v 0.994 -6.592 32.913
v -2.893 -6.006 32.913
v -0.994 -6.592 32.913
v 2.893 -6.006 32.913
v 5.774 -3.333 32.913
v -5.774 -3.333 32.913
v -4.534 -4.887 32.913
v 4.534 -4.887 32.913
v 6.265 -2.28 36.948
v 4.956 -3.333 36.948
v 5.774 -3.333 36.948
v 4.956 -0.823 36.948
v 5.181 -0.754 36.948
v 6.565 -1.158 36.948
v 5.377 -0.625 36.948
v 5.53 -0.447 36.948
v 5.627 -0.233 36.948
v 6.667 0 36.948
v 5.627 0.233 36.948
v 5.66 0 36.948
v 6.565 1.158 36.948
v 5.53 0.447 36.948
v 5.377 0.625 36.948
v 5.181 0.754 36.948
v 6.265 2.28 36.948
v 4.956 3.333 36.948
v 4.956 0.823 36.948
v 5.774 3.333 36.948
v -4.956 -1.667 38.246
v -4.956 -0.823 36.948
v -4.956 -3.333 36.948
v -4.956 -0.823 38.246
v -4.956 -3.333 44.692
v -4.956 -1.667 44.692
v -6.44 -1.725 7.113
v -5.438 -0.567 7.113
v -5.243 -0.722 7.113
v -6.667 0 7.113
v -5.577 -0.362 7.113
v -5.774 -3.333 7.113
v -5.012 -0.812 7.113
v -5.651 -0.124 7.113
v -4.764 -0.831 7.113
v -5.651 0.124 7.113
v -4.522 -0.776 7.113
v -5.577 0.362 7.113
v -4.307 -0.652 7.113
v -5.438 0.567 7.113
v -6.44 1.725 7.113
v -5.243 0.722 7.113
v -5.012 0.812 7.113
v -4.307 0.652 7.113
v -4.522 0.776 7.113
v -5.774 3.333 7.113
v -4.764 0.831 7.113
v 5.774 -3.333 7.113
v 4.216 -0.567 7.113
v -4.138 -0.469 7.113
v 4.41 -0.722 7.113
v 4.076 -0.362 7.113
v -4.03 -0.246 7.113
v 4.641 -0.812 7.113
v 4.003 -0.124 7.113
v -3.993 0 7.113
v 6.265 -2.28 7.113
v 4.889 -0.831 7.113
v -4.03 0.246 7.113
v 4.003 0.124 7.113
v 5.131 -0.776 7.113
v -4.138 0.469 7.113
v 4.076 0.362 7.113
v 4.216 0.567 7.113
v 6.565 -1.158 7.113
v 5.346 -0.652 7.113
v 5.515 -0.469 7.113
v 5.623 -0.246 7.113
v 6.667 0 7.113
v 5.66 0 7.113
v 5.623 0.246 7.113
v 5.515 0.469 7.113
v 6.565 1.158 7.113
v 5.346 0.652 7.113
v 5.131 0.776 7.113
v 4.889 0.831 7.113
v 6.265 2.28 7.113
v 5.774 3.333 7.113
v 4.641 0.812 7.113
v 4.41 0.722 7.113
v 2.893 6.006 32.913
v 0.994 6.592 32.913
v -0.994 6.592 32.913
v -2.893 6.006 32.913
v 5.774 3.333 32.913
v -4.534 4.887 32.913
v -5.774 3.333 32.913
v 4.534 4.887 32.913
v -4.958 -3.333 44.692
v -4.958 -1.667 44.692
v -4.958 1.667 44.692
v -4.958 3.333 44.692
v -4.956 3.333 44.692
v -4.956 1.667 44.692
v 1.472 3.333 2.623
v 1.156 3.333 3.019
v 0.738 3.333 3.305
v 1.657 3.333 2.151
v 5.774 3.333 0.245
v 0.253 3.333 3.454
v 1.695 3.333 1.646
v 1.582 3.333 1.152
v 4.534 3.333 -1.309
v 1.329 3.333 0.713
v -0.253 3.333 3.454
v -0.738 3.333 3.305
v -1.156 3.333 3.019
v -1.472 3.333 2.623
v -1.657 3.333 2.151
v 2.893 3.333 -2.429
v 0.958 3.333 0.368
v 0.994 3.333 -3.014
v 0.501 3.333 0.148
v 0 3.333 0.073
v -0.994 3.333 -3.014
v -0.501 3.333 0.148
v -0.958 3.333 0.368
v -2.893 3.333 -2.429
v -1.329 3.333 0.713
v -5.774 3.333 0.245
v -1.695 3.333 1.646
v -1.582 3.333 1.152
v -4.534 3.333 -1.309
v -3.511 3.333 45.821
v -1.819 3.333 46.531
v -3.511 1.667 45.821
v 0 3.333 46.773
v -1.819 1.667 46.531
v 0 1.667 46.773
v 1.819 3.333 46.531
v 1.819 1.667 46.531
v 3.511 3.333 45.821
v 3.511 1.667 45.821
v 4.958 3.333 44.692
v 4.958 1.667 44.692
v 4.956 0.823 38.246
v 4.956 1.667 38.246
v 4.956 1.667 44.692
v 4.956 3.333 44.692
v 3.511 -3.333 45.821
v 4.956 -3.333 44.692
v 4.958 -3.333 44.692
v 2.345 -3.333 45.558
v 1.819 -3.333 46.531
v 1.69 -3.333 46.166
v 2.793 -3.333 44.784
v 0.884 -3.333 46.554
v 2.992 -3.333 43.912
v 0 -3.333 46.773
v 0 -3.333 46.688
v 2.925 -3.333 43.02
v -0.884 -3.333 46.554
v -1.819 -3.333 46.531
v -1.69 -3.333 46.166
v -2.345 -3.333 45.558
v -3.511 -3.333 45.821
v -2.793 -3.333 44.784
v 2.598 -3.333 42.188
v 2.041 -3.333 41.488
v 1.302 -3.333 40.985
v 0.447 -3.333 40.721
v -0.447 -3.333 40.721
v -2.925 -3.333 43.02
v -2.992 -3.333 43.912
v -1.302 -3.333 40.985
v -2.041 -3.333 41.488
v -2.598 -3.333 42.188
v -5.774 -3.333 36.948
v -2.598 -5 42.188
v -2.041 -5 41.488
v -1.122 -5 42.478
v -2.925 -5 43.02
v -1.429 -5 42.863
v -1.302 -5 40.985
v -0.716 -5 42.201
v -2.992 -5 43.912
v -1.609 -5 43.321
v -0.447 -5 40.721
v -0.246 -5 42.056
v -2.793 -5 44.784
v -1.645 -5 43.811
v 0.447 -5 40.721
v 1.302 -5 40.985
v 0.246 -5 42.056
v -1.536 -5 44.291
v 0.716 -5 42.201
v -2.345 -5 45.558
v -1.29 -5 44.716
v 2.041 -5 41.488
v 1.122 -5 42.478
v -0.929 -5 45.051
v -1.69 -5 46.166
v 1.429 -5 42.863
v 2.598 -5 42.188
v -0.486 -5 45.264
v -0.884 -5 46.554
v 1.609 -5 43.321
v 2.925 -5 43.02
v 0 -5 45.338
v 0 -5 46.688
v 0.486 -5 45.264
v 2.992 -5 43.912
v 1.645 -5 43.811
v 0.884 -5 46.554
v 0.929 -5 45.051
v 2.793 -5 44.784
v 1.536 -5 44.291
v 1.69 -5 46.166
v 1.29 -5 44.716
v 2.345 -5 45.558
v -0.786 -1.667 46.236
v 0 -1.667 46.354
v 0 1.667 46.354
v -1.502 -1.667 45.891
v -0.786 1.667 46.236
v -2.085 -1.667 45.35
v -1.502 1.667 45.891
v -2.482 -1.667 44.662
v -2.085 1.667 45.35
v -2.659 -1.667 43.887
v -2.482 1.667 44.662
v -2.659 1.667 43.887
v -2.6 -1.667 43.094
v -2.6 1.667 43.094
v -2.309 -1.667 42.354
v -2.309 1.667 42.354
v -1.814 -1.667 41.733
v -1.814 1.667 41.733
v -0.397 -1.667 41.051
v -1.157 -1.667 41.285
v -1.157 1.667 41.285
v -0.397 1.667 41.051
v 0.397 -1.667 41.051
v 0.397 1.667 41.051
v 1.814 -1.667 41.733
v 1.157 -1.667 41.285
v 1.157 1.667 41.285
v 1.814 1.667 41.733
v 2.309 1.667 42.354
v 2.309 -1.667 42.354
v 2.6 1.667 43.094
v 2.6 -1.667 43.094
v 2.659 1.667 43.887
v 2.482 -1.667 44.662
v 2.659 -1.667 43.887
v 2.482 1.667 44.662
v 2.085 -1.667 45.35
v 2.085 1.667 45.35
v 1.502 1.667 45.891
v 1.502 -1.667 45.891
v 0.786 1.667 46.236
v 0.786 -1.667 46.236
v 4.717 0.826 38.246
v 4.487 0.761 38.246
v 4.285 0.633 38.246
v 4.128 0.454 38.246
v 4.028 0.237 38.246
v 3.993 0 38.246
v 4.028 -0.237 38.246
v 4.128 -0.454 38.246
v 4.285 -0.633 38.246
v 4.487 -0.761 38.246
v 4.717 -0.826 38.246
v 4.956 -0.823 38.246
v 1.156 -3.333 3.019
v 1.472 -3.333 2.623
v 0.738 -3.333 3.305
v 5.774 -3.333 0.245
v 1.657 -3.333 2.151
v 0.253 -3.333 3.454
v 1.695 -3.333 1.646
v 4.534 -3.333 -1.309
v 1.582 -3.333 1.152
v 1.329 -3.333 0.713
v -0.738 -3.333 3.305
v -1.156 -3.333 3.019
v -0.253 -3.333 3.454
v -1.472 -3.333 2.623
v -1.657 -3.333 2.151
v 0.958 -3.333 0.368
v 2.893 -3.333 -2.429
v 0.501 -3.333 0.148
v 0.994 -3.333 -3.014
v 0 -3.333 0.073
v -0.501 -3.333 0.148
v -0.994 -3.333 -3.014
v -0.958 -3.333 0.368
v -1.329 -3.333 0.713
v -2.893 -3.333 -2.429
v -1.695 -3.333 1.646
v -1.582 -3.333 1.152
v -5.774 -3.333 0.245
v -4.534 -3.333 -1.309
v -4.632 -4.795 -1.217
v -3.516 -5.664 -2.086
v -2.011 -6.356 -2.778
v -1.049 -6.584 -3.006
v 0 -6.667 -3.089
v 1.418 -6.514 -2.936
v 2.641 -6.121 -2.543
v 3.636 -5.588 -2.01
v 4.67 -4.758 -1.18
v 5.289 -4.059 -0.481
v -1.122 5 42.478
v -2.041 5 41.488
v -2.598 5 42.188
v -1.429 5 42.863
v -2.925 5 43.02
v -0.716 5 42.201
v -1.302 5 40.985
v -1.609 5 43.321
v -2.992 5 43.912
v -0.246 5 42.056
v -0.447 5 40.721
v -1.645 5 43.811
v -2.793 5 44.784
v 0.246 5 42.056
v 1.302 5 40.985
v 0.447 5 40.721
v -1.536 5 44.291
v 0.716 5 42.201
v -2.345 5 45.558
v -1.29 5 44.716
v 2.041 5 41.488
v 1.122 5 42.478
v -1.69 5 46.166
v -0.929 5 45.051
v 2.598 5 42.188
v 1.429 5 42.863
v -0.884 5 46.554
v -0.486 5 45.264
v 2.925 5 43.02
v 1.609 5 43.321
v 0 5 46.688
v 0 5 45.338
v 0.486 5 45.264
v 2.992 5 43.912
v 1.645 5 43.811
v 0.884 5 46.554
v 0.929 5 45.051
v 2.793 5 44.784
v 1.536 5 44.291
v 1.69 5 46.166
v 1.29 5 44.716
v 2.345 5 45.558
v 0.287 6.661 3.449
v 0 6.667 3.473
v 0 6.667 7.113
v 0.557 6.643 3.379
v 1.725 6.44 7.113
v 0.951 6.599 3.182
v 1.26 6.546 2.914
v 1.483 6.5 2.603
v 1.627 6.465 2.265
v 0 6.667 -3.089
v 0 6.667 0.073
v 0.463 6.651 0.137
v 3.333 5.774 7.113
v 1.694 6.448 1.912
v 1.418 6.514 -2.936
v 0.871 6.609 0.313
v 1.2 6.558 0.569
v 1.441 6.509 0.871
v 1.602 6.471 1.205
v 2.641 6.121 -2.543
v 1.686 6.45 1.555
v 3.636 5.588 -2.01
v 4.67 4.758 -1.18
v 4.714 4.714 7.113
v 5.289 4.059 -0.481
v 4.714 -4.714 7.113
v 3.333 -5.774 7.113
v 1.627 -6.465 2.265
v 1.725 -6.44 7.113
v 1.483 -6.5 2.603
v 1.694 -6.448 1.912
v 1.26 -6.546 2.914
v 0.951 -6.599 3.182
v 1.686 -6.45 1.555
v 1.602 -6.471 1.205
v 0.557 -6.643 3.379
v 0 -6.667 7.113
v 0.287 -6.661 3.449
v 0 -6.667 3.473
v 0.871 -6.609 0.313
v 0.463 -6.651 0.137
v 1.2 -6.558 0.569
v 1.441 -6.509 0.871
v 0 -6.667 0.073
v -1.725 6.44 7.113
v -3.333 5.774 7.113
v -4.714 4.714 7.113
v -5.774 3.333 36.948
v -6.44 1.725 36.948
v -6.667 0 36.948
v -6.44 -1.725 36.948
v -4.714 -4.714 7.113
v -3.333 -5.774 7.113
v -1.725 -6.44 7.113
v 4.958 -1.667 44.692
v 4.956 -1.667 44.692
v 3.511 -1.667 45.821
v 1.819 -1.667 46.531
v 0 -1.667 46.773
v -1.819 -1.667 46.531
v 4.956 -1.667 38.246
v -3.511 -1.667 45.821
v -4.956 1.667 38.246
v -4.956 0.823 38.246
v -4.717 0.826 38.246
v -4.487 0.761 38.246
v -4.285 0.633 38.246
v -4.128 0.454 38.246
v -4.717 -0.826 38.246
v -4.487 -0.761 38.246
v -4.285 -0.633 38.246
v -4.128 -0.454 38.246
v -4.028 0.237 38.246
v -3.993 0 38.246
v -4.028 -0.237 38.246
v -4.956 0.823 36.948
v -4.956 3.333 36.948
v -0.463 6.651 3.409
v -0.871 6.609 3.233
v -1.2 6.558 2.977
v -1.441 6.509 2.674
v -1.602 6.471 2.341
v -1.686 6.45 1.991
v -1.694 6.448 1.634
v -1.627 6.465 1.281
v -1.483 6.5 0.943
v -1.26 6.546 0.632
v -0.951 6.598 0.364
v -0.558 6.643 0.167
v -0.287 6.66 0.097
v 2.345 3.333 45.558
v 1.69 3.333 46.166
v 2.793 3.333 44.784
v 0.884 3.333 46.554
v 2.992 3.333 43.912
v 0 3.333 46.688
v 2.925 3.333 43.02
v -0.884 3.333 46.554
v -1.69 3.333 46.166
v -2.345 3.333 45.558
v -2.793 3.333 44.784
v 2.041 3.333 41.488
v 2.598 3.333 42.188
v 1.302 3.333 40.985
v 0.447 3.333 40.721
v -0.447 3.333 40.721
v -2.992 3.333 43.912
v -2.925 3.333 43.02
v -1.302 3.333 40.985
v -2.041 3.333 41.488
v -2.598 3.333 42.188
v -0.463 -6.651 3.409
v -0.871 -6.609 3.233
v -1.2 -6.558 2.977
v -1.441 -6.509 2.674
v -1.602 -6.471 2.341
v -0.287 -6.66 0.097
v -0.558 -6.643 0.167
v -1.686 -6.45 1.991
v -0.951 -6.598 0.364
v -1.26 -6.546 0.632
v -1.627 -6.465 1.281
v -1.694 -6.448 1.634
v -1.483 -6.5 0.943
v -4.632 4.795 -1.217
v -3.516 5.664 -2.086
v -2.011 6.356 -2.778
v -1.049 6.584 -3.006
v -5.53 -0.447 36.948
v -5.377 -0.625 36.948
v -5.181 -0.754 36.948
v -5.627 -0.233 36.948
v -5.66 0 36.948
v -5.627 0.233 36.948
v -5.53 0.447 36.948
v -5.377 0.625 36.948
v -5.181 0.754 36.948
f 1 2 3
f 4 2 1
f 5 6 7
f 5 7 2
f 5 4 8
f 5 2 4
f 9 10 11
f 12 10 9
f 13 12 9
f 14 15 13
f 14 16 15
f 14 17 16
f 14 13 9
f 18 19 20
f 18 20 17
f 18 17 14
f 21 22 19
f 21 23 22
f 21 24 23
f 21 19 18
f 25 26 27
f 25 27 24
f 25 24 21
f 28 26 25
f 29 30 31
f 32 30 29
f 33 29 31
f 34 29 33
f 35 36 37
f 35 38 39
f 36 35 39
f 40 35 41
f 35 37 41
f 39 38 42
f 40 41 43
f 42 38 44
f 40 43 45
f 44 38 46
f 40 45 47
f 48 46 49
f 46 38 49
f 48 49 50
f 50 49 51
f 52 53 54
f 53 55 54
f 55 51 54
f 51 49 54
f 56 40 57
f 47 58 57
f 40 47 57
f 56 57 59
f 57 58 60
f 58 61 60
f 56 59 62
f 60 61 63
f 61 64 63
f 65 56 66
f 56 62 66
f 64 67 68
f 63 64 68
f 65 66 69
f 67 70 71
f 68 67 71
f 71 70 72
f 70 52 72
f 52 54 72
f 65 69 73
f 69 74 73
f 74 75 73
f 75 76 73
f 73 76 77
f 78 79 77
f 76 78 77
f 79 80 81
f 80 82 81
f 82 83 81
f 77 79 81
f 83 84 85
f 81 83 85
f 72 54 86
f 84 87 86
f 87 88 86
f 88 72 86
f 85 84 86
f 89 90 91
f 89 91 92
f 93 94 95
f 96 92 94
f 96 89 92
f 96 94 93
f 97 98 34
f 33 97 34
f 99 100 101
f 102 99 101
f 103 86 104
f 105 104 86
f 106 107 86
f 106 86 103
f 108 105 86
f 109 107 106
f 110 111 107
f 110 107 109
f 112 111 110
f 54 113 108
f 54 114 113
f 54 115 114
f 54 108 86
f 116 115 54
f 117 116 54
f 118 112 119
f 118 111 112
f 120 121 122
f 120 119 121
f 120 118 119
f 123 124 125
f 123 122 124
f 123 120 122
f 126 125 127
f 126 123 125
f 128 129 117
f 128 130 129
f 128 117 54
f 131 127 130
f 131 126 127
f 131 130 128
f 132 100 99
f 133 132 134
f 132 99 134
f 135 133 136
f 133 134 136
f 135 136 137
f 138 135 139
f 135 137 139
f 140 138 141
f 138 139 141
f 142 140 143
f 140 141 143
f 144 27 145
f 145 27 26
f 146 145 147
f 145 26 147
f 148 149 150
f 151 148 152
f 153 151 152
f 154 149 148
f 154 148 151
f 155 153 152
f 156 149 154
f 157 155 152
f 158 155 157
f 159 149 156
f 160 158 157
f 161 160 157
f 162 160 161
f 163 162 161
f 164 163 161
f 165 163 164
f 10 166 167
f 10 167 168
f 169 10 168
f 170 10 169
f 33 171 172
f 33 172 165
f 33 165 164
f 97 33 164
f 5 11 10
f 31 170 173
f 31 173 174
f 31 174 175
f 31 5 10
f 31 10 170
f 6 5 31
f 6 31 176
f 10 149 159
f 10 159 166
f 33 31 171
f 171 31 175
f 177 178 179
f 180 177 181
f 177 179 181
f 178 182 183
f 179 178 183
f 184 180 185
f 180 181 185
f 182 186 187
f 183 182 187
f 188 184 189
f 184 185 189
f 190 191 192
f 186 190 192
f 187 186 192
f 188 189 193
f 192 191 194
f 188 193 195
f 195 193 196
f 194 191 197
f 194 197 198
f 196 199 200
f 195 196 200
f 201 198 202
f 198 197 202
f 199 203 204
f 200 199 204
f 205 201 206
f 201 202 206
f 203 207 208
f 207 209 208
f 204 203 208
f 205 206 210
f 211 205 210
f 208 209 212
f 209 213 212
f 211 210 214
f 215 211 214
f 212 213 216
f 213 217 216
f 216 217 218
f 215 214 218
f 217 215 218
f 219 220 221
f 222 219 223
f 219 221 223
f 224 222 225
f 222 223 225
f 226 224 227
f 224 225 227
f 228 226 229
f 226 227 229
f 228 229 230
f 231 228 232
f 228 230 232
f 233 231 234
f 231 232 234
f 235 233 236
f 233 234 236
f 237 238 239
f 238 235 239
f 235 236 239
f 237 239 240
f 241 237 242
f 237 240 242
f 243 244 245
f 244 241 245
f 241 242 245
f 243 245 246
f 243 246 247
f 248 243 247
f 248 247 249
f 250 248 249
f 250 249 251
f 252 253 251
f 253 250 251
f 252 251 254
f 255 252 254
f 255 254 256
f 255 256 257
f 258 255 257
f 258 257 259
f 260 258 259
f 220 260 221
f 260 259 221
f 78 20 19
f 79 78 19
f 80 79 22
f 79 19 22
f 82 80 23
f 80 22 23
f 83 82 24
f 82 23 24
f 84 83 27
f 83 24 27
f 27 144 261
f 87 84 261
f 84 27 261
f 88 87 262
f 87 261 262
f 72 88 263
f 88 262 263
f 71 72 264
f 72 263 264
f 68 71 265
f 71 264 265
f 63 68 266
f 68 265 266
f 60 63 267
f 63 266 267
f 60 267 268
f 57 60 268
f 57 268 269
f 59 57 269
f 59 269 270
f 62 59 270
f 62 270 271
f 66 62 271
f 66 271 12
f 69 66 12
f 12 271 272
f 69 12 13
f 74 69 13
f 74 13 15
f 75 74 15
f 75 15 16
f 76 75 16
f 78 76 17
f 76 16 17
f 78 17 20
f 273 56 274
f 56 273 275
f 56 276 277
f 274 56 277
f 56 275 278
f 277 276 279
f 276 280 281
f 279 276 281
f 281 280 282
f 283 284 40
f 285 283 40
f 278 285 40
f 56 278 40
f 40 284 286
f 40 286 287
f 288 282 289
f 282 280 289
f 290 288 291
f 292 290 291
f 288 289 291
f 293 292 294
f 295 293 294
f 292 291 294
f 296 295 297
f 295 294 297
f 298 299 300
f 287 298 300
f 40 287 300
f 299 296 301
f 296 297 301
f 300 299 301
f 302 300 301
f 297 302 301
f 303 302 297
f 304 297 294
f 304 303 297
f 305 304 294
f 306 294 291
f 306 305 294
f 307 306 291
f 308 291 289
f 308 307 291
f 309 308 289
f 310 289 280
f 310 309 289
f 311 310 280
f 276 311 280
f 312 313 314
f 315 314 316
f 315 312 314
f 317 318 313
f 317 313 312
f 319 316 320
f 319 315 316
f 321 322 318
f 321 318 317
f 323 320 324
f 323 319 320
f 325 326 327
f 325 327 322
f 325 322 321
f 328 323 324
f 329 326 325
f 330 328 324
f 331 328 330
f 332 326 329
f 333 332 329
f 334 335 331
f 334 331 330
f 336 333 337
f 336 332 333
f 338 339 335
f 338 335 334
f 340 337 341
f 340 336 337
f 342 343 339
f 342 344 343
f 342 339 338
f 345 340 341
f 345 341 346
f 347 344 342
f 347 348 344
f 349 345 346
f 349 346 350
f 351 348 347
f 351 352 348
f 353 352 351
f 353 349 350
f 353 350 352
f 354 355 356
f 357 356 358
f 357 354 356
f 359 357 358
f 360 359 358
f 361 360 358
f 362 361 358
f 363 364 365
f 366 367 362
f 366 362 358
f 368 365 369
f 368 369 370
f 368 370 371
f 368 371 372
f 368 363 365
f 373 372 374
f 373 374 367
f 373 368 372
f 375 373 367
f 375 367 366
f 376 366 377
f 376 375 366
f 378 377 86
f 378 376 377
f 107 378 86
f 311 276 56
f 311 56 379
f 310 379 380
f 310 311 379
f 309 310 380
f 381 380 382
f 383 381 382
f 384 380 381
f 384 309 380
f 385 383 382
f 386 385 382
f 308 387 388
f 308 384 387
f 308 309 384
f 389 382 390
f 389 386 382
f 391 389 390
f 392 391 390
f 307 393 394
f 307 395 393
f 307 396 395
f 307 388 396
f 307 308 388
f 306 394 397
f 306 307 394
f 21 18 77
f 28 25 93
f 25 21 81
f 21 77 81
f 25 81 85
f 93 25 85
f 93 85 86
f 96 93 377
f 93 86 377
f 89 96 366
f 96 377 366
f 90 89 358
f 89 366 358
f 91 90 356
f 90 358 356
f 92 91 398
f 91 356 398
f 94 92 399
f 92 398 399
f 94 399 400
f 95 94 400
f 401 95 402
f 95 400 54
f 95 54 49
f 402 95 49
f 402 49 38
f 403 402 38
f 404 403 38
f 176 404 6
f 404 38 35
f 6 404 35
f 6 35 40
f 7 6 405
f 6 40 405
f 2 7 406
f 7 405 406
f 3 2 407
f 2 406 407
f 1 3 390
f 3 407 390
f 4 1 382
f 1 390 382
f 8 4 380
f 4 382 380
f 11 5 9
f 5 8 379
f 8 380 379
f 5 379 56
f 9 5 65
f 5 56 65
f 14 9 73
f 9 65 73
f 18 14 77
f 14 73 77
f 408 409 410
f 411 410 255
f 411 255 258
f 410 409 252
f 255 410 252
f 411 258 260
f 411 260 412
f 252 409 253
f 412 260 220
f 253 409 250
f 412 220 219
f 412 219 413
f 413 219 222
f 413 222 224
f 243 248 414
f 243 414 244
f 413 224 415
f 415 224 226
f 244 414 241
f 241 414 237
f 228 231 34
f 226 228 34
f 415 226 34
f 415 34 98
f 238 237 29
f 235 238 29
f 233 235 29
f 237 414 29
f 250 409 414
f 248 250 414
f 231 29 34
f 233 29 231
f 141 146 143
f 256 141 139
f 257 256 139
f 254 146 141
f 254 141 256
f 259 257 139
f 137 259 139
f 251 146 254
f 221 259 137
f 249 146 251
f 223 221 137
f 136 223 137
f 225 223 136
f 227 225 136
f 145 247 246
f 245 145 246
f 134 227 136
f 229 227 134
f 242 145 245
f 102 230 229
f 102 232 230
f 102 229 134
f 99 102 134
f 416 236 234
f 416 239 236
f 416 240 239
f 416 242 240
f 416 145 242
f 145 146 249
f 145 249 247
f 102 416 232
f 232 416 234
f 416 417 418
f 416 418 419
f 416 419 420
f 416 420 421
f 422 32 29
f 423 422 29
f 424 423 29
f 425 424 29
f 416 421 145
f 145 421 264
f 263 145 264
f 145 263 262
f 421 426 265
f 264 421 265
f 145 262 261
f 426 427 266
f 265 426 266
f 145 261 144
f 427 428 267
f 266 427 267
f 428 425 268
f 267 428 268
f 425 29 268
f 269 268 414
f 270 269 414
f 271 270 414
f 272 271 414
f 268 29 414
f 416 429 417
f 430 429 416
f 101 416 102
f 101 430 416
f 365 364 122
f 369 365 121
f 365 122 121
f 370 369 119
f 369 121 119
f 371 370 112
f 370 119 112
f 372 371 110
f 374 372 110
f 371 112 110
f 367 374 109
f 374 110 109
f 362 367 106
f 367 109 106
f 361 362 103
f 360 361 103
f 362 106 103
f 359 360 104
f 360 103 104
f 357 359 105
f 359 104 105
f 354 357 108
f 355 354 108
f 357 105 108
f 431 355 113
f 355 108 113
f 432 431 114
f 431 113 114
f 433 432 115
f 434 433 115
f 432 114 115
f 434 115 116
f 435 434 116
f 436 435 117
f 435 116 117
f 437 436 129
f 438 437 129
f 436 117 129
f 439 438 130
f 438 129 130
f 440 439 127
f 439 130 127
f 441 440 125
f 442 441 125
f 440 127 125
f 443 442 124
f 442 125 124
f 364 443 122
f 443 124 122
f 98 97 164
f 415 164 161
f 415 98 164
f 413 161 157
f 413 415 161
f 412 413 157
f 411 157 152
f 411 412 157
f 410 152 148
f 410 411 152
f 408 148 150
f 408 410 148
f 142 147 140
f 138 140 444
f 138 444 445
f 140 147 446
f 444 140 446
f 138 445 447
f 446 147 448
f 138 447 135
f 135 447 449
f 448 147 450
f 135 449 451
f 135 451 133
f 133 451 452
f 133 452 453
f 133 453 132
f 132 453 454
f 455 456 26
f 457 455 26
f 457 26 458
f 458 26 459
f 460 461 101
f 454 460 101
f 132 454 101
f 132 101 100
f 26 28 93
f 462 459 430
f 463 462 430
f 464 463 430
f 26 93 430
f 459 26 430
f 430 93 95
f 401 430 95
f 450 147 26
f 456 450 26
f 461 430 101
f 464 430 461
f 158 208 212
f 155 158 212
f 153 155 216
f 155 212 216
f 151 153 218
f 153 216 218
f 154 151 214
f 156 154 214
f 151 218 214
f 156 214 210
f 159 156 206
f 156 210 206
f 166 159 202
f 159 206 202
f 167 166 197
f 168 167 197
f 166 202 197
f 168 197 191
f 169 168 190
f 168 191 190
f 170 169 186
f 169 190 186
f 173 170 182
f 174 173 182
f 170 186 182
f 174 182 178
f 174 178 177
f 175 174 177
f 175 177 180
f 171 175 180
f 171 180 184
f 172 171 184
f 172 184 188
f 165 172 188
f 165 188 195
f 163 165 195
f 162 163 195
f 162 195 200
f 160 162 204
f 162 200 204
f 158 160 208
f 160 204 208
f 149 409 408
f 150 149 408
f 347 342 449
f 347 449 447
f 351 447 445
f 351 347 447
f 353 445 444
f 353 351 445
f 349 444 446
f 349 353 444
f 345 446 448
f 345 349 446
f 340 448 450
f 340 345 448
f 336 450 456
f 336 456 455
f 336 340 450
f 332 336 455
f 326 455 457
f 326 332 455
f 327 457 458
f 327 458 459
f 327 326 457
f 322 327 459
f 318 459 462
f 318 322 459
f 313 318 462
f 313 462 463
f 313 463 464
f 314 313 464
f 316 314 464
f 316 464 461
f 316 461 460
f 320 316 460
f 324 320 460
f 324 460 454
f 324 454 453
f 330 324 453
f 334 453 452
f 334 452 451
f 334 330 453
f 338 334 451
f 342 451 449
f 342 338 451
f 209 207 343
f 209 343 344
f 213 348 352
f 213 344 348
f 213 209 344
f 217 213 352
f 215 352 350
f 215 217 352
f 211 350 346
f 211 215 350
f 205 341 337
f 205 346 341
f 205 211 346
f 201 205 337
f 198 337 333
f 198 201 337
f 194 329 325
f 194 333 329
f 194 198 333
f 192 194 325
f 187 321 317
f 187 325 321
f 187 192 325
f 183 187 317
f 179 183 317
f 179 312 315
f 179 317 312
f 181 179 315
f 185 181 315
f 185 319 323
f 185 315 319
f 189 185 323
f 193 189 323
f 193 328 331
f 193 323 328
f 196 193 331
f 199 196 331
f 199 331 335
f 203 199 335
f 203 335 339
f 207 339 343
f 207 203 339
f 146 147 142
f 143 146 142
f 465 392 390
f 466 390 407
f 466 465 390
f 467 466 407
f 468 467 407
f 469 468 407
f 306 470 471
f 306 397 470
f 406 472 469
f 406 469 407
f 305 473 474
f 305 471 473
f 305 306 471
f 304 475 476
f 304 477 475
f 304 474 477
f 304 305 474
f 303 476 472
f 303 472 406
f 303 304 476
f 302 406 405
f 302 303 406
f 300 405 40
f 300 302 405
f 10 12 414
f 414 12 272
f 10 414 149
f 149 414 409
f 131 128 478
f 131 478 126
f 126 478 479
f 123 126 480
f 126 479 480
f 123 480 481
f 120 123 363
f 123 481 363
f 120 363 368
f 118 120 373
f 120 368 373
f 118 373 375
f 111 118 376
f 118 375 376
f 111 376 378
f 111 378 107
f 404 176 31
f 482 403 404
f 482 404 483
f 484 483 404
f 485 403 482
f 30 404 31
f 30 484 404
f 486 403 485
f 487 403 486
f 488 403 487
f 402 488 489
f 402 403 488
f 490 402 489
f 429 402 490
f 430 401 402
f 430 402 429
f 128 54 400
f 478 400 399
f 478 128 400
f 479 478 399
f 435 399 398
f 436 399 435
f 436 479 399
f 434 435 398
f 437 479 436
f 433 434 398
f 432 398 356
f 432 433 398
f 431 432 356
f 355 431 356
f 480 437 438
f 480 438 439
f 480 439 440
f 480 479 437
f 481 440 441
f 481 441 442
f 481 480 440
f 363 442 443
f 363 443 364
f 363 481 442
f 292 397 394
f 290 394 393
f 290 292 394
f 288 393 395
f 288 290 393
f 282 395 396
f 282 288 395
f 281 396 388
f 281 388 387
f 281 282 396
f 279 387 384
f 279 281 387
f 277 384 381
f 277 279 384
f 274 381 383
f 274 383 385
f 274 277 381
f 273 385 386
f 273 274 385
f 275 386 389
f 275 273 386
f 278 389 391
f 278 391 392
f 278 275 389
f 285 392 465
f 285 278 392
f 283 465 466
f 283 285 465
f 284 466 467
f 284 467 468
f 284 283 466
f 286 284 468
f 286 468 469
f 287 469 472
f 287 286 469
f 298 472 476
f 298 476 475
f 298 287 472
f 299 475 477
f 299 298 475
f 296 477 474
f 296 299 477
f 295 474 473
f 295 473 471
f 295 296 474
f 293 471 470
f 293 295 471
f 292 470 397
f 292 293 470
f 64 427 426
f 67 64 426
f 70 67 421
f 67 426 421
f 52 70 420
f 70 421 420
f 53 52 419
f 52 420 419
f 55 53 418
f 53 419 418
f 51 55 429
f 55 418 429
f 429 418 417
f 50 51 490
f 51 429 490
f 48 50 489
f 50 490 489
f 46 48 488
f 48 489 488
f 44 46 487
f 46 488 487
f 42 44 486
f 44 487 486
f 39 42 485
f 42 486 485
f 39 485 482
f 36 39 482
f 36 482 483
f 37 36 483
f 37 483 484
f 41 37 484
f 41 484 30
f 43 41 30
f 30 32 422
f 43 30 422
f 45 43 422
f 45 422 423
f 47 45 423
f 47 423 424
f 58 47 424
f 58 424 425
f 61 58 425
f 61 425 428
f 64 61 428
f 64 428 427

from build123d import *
from build123d.topology import SkipClean

# Parameters (mm, degrees)
SKETCH2_R                       = 10
PHALANGE_LENGTH_DEPTH           = 46.7
BOSS_EXTRUDE3_DEPTH             = 5
BOSS_EXTRUDE4_DEPTH             = 5
BOSS_EXTRUDE4_DEPTH_BACK        = 5
CUT_EXTRUDE2_START              = -15.3025
CUT_EXTRUDE2_DEPTH              = 15.3025
SKETCH7_R                       = 1.65
CUT_EXTRUDE3_DEPTH              = 10
CUT_EXTRUDE4_DEPTH              = 2.5
CUT_EXTRUDE4_DEPTH_BACK         = 2.5
CUT_EXTRUDE7_REACH              = 66.618
SKETCH4_R                       = 1.65
CUT_EXTRUDE7_DIRECTION_2_REACH  = 66.618
CUT_EXTRUDE_THIN1_START         = 46.7
CUT_EXTRUDE_THIN1_DEPTH         = 10.361670454
BOSS_EXTRUDE5_REACH             = 66.084
SKETCH9_R                       = 4
SKETCH9_R_2                     = 1.65
CUT_EXTRUDE8_REACH              = 65.595
SKETCH10_R                      = 1.25
CUT_EXTRUDE9_START              = -8
CUT_EXTRUDE9_DEPTH              = 8
CUT_EXTRUDE10_REACH             = 66.084
CUT_EXTRUDE10_DIRECTION_2_REACH = 66.084
CUT_EXTRUDE11_START             = -10
CUT_EXTRUDE11_OUTLINE_W         = 2.565773848
CUT_EXTRUDE11_OUTLINE_H         = 11.6166929
CUT_EXTRUDE11_DEPTH             = 10
BOSS_EXTRUDE6_START             = 7.5
SKETCH14_R                      = 4.5
SKETCH14_R_2                    = 1.65
BOSS_EXTRUDE6_DEPTH             = 2.5
BOSS_EXTRUDE7_START             = -7.5
SKETCH14_2_R                    = 4.5
SKETCH14_2_R_2                  = 1.65
BOSS_EXTRUDE7_DEPTH             = 2.5
SCALE1_SCALE                    = 0.666666667
CUT_EXTRUDE12_START             = -11.666667
SKETCH15_R                      = 1.65
CUT_EXTRUDE12_DEPTH             = 13.333339
CUT_EXTRUDE13_REACH             = 50.293
SKETCH16_R                      = 1.7
CUT_EXTRUDE13_DIRECTION_2_REACH = 50.293


# Read off the part's stored shape, not the designer's step: Cut-Extrude-Thin1, Cut-Extrude11
with BuildPart() as part:
    # Sketch2 → Phalange Length (new body)
    with BuildSketch(Plane.XY):
        Circle(SKETCH2_R)
    extrude(amount=PHALANGE_LENGTH_DEPTH)

    # Sketch3 → Boss-Extrude3 (add)
    with BuildSketch(Plane(origin=(0, -10, 0), x_dir=(-1, 0, 0), z_dir=(0, -1, 0))):
        with BuildLine():
            Line((-10, 5.302499701), (-10, 0))
            Line((-10, 0), (10, 0))
            Line((10, 0), (10, 5.302499701))
            ThreePointArc((10, 5.302499701), (0, 15.302499701), (-10, 5.302499701))
        make_face()
    boss_extrude3 = extrude(amount=-BOSS_EXTRUDE3_DEPTH)

    # Mirror1: Boss-Extrude3 across plane
    add(boss_extrude3.mirror(Plane.ZX))

    # Sketch5 → Boss-Extrude4 (add, two sides: drawn at the far end of the back side and taken through both)
    with BuildSketch(Plane(origin=(0, 0, 0), x_dir=(1, 0, 0), z_dir=(0, 1, 0)).offset(-BOSS_EXTRUDE4_DEPTH_BACK)):
        with BuildLine():
            Line((-10, -52.483157911), (-10, -46.7))
            Line((-10, -46.7), (10, -46.7))
            Line((10, -46.7), (10, -52.483157911))
            ThreePointArc((10, -52.483157911), (0, -62.051984156), (-10, -52.483157911))
        make_face()
    extrude(amount=BOSS_EXTRUDE4_DEPTH + BOSS_EXTRUDE4_DEPTH_BACK)

    # Sketch6 → Cut-Extrude2 (cut)
    with SkipClean():  # the faces are left unmerged after this step: merging them gives an invalid solid
        with BuildSketch(Plane.XY.offset(CUT_EXTRUDE2_START)):
            with BuildLine():
                ThreePointArc((0, 10), (5, 8.660254038), (8.660254038, 5))
                Line((8.660254038, 5), (10, 5))
                Line((10, 5), (10, 10))
                Line((10, 10), (0, 10))
            make_face()
            with BuildLine():
                Line((10, -5), (8.660254038, -5))
                ThreePointArc((8.660254038, -5), (5, -8.660254038), (0, -10))
                Line((0, -10), (10, -10))
                Line((10, -10), (10, -5))
            make_face()
            with BuildLine():
                ThreePointArc((-8.660254038, 5), (-5, 8.660254038), (0, 10))
                Line((0, 10), (-10, 10))
                Line((-10, 10), (-10, 5))
                Line((-10, 5), (-8.660254038, 5))
            make_face()
            with BuildLine():
                Line((-10, -10), (0, -10))
                ThreePointArc((0, -10), (-5, -8.660254038), (-8.660254038, -5))
                Line((-8.660254038, -5), (-10, -5))
                Line((-10, -5), (-10, -10))
            make_face()
        extrude(amount=CUT_EXTRUDE2_DEPTH, mode=Mode.SUBTRACT)

    # Sketch7 → Cut-Extrude3 (cut)
    with SkipClean():  # the faces are left unmerged after this step: merging them gives an invalid solid
        with BuildSketch(Plane(origin=(0, 5, 0), x_dir=(1, 0, 0), z_dir=(0, 1, 0))):
            with Locations(Location((0, -54.861984156, 0), (0, 0, 270))):
                Circle(SKETCH7_R)
        extrude(amount=-CUT_EXTRUDE3_DEPTH, mode=Mode.SUBTRACT)

    # Sketch5<2> → Cut-Extrude4 (cut, two sides: drawn at the far end of the back side and taken through both)
    with BuildSketch(Plane(origin=(0, 0, 0), x_dir=(1, 0, 0), z_dir=(0, 1, 0)).offset(-CUT_EXTRUDE4_DEPTH_BACK)):
        with BuildLine():
            Line((-10, -52.483157911), (-10, -46.7))
            Line((-10, -46.7), (10, -46.7))
            Line((10, -46.7), (10, -52.483157911))
            ThreePointArc((10, -52.483157911), (0, -62.051984156), (-10, -52.483157911))
        make_face()
    extrude(amount=CUT_EXTRUDE4_DEPTH + CUT_EXTRUDE4_DEPTH_BACK, mode=Mode.SUBTRACT)

    # Sketch4 → Cut-Extrude7 (cut, up to next)
    with BuildSketch(Plane(origin=(0, -5, 0), x_dir=(1, 0, 0), z_dir=(0, 1, 0)), mode=Mode.PRIVATE) as cut_extrude7_sk1:
        with Locations(Location((0, 8.010159673, 0), (0, 0, 270))):
            Circle(SKETCH4_R)
    cut_extrude7_tool1 = extrude(cut_extrude7_sk1.sketch, amount=-CUT_EXTRUDE7_REACH, mode=Mode.PRIVATE) & part.part
    add(cut_extrude7_tool1.solids().sort_by_distance((0, -5, -8.01016))[0], mode=Mode.SUBTRACT)

    # Sketch4 → Cut-Extrude7 direction 2 (cut, up to next)
    with BuildSketch(Plane(origin=(0, -5, 0), x_dir=(1, 0, 0), z_dir=(0, 1, 0)), mode=Mode.PRIVATE) as cut_extrude7_direction_2_sk1:
        with Locations(Location((0, 8.010159673, 0), (0, 0, 270))):
            Circle(SKETCH4_R)
    cut_extrude7_direction_2_tool1 = extrude(cut_extrude7_direction_2_sk1.sketch, amount=CUT_EXTRUDE7_DIRECTION_2_REACH, mode=Mode.PRIVATE) & part.part
    add(cut_extrude7_direction_2_tool1.solids().sort_by_distance((0, -5, -8.01016))[0], mode=Mode.SUBTRACT)

    # Cut-Extrude-Thin1 outline → Cut-Extrude-Thin1 (cut)
    with SkipClean():  # the faces are left unmerged after this step: merging them gives an invalid solid
        with BuildSketch(Plane.XY.offset(CUT_EXTRUDE_THIN1_START)):
            with BuildLine():
                ThreePointArc((8.660254038, 5), (9.256147934, 3.78466979), (9.682458366, 2.5))
                Line((9.682458366, 2.5), (10, 2.5))
                Line((10, 2.5), (10, 5))
                Line((10, 5), (8.660254038, 5))
            make_face()
            with BuildLine():
                Line((10, -2.5), (9.682458366, -2.5))
                ThreePointArc((9.682458366, -2.5), (9.256147934, -3.78466979), (8.660254038, -5))
                Line((8.660254038, -5), (10, -5))
                Line((10, -5), (10, -2.5))
            make_face()
            with BuildLine():
                Line((-10, 2.5), (-9.682458366, 2.5))
                ThreePointArc((-9.682458366, 2.5), (-9.256147934, 3.78466979), (-8.660254038, 5))
                Line((-8.660254038, 5), (-10, 5))
                Line((-10, 5), (-10, 2.5))
            make_face()
            with BuildLine():
                ThreePointArc((-8.660254038, -5), (-9.256147934, -3.78466979), (-9.682458366, -2.5))
                Line((-9.682458366, -2.5), (-10, -2.5))
                Line((-10, -2.5), (-10, -5))
                Line((-10, -5), (-8.660254038, -5))
            make_face()
        extrude(amount=CUT_EXTRUDE_THIN1_DEPTH, mode=Mode.SUBTRACT)

    # Sketch9 → Boss-Extrude5 (add, up to next)
    with BuildSketch(Plane.XZ.offset(-2.5), mode=Mode.PRIVATE) as boss_extrude5_sk1:
        with Locations(Location((0, 54.861984156, 0), (0, 0, 90))):
            Circle(SKETCH9_R)
        with Locations(Location((0, 54.861984156, 0), (0, 0, 90))):
            Circle(SKETCH9_R_2, mode=Mode.SUBTRACT)
    boss_extrude5_tool1 = extrude(boss_extrude5_sk1.sketch, amount=BOSS_EXTRUDE5_REACH, mode=Mode.PRIVATE) - part.part
    add(boss_extrude5_tool1.solids().sort_by_distance((0, 2.5, 50.975121))[0])

    # Sketch10 → Cut-Extrude8 (cut, up to next)
    with BuildSketch(Plane.XY.offset(46.7), mode=Mode.PRIVATE) as cut_extrude8_sk1:
        with Locations((7.239961745, 0)):
            Circle(SKETCH10_R)
    cut_extrude8_tool1 = extrude(cut_extrude8_sk1.sketch, amount=-CUT_EXTRUDE8_REACH, mode=Mode.PRIVATE) & part.part
    # Sketch10 → Cut-Extrude8 (cut, up to next)
    with BuildSketch(Plane.XY.offset(46.7), mode=Mode.PRIVATE) as cut_extrude8_sk2:
        with Locations((-7.239961745, 0)):
            Circle(SKETCH10_R)
    cut_extrude8_tool2 = extrude(cut_extrude8_sk2.sketch, amount=-CUT_EXTRUDE8_REACH, mode=Mode.PRIVATE) & part.part
    add(cut_extrude8_tool1.solids().sort_by_distance((7.239962, 0, 46.7))[0], mode=Mode.SUBTRACT)
    add(cut_extrude8_tool2.solids().sort_by_distance((-7.239962, 0, 46.7))[0], mode=Mode.SUBTRACT)

    # Sketch11 → Cut-Extrude9 (cut)
    with SkipClean():  # the faces are left unmerged after this step: merging them gives an invalid solid
        with BuildSketch(Plane.XY.offset(46.7).offset(CUT_EXTRUDE9_START)):
            with BuildLine():
                ThreePointArc((8.660254038, 5), (0, 10), (-8.660254038, 5))
                Line((-8.660254038, 5), (8.660254038, 5))
            make_face()
            with BuildLine():
                Line((8.660254038, -5), (-8.660254038, -5))
                ThreePointArc((-8.660254038, -5), (0, -10), (8.660254038, -5))
            make_face()
        extrude(amount=CUT_EXTRUDE9_DEPTH, mode=Mode.SUBTRACT)

    # Sketch12 → Cut-Extrude10 (cut, up to next)
    with BuildSketch(Plane.XZ.offset(-2.5), mode=Mode.PRIVATE) as cut_extrude10_sk1:
        with BuildLine():
            ThreePointArc((0, 62.051984156), (-5.99753031, 60.05625831), (-9.603498629, 54.864892021))
            Line((-9.603498629, 54.864892021), (-8.660254038, 54.864892021))
            ThreePointArc((-8.660254038, 54.864892021), (0, 59.490740593), (8.660254038, 54.864892021))
            Line((8.660254038, 54.864892021), (9.603498629, 54.864892021))
            ThreePointArc((9.603498629, 54.864892021), (5.99753031, 60.05625831), (0, 62.051984156))
        make_face()
    cut_extrude10_tool1 = extrude(cut_extrude10_sk1.sketch, amount=CUT_EXTRUDE10_REACH, mode=Mode.PRIVATE) & part.part
    add(cut_extrude10_tool1.solids().sort_by_distance((5.874655, 2.5, 59.89207))[0], mode=Mode.SUBTRACT)

    # Sketch12 → Cut-Extrude10 direction 2 (cut, up to next)
    with BuildSketch(Plane.XZ.offset(-2.5), mode=Mode.PRIVATE) as cut_extrude10_direction_2_sk1:
        with BuildLine():
            ThreePointArc((0, 62.051984156), (-5.99753031, 60.05625831), (-9.603498629, 54.864892021))
            Line((-9.603498629, 54.864892021), (-8.660254038, 54.864892021))
            ThreePointArc((-8.660254038, 54.864892021), (0, 59.490740593), (8.660254038, 54.864892021))
            Line((8.660254038, 54.864892021), (9.603498629, 54.864892021))
            ThreePointArc((9.603498629, 54.864892021), (5.99753031, 60.05625831), (0, 62.051984156))
        make_face()
    cut_extrude10_direction_2_tool1 = extrude(cut_extrude10_direction_2_sk1.sketch, amount=-CUT_EXTRUDE10_DIRECTION_2_REACH, mode=Mode.PRIVATE) & part.part
    add(cut_extrude10_direction_2_tool1.solids().sort_by_distance((5.874655, 2.5, 59.89207))[0], mode=Mode.SUBTRACT)

    # Cut-Extrude11 outline → Cut-Extrude11 (cut)
    with BuildSketch(Plane.XZ.offset(5).offset(CUT_EXTRUDE11_START)):
        with Locations((-8.717113076, 50.560571369)):
            Rectangle(CUT_EXTRUDE11_OUTLINE_W, CUT_EXTRUDE11_OUTLINE_H)
        with Locations((8.717113076, 50.560571369)):
            Rectangle(CUT_EXTRUDE11_OUTLINE_W, CUT_EXTRUDE11_OUTLINE_H)
    extrude(amount=CUT_EXTRUDE11_DEPTH, mode=Mode.SUBTRACT)

    # Sketch14 → Boss-Extrude6 (add)
    with SkipClean():  # the faces are left unmerged after this step: merging them gives an invalid solid
        with BuildSketch(Plane(origin=(0, 0, 0), x_dir=(1, 0, 0), z_dir=(0, 1, 0)).offset(BOSS_EXTRUDE6_START)):
            with Locations(Location((0, -54.861984156, 0), (0, 0, 270))):
                Circle(SKETCH14_R)
            with Locations(Location((0, -54.861984156, 0), (0, 0, 270))):
                Circle(SKETCH14_R_2, mode=Mode.SUBTRACT)
        extrude(amount=-BOSS_EXTRUDE6_DEPTH)

    # Sketch14<2> → Boss-Extrude7 (add)
    with SkipClean():  # the faces are left unmerged after this step: merging them gives an invalid solid
        with BuildSketch(Plane(origin=(0, 0, 0), x_dir=(1, 0, 0), z_dir=(0, 1, 0)).offset(BOSS_EXTRUDE7_START)):
            with Locations(Location((0, -54.861984156, 0), (0, 0, 270))):
                Circle(SKETCH14_2_R)
            with Locations(Location((0, -54.861984156, 0), (0, 0, 270))):
                Circle(SKETCH14_2_R_2, mode=Mode.SUBTRACT)
        extrude(amount=BOSS_EXTRUDE7_DEPTH)


with BuildPart() as part_1:
    # Scale1: scaled about (0, 4.3e-08, 21.33862286)
    add(part.part.scale(SCALE1_SCALE).moved(Location((0, 1.4e-08, 7.112874287))))

    # Sketch15 → Cut-Extrude12 (cut)
    with BuildSketch(Plane(origin=(0, 4.999994977, 0), x_dir=(1, 0, 0), z_dir=(0, 1, 0)).offset(CUT_EXTRUDE12_START)):
        with Locations(Location((-5.6e-08, -43.687701746, 0), (0, 0, 270))):
            Circle(SKETCH15_R)
    extrude(amount=CUT_EXTRUDE12_DEPTH, mode=Mode.SUBTRACT)

    # Sketch16 → Cut-Extrude13 (cut, up to next)
    with BuildSketch(Plane.XZ.offset(-3.333328311), mode=Mode.PRIVATE) as cut_extrude13_sk1:
        with Locations(Location((-5.6e-08, 1.772939193, 0), (0, 0, 270))):
            Circle(SKETCH16_R)
    cut_extrude13_tool1 = extrude(cut_extrude13_sk1.sketch, amount=-CUT_EXTRUDE13_REACH, mode=Mode.PRIVATE) & part_1.part
    add(cut_extrude13_tool1.solids().sort_by_distance((0, 3.333328, 1.772939))[0], mode=Mode.SUBTRACT)

    # Sketch16 → Cut-Extrude13 direction 2 (cut, up to next)
    with BuildSketch(Plane.XZ.offset(-3.333328311), mode=Mode.PRIVATE) as cut_extrude13_direction_2_sk1:
        with Locations(Location((-5.6e-08, 1.772939193, 0), (0, 0, 270))):
            Circle(SKETCH16_R)
    cut_extrude13_direction_2_tool1 = extrude(cut_extrude13_direction_2_sk1.sketch, amount=CUT_EXTRUDE13_DIRECTION_2_REACH, mode=Mode.PRIVATE) & part_1.part
    add(cut_extrude13_direction_2_tool1.solids().sort_by_distance((0, 3.333328, 1.772939))[0], mode=Mode.SUBTRACT)


solid = part_1.part
